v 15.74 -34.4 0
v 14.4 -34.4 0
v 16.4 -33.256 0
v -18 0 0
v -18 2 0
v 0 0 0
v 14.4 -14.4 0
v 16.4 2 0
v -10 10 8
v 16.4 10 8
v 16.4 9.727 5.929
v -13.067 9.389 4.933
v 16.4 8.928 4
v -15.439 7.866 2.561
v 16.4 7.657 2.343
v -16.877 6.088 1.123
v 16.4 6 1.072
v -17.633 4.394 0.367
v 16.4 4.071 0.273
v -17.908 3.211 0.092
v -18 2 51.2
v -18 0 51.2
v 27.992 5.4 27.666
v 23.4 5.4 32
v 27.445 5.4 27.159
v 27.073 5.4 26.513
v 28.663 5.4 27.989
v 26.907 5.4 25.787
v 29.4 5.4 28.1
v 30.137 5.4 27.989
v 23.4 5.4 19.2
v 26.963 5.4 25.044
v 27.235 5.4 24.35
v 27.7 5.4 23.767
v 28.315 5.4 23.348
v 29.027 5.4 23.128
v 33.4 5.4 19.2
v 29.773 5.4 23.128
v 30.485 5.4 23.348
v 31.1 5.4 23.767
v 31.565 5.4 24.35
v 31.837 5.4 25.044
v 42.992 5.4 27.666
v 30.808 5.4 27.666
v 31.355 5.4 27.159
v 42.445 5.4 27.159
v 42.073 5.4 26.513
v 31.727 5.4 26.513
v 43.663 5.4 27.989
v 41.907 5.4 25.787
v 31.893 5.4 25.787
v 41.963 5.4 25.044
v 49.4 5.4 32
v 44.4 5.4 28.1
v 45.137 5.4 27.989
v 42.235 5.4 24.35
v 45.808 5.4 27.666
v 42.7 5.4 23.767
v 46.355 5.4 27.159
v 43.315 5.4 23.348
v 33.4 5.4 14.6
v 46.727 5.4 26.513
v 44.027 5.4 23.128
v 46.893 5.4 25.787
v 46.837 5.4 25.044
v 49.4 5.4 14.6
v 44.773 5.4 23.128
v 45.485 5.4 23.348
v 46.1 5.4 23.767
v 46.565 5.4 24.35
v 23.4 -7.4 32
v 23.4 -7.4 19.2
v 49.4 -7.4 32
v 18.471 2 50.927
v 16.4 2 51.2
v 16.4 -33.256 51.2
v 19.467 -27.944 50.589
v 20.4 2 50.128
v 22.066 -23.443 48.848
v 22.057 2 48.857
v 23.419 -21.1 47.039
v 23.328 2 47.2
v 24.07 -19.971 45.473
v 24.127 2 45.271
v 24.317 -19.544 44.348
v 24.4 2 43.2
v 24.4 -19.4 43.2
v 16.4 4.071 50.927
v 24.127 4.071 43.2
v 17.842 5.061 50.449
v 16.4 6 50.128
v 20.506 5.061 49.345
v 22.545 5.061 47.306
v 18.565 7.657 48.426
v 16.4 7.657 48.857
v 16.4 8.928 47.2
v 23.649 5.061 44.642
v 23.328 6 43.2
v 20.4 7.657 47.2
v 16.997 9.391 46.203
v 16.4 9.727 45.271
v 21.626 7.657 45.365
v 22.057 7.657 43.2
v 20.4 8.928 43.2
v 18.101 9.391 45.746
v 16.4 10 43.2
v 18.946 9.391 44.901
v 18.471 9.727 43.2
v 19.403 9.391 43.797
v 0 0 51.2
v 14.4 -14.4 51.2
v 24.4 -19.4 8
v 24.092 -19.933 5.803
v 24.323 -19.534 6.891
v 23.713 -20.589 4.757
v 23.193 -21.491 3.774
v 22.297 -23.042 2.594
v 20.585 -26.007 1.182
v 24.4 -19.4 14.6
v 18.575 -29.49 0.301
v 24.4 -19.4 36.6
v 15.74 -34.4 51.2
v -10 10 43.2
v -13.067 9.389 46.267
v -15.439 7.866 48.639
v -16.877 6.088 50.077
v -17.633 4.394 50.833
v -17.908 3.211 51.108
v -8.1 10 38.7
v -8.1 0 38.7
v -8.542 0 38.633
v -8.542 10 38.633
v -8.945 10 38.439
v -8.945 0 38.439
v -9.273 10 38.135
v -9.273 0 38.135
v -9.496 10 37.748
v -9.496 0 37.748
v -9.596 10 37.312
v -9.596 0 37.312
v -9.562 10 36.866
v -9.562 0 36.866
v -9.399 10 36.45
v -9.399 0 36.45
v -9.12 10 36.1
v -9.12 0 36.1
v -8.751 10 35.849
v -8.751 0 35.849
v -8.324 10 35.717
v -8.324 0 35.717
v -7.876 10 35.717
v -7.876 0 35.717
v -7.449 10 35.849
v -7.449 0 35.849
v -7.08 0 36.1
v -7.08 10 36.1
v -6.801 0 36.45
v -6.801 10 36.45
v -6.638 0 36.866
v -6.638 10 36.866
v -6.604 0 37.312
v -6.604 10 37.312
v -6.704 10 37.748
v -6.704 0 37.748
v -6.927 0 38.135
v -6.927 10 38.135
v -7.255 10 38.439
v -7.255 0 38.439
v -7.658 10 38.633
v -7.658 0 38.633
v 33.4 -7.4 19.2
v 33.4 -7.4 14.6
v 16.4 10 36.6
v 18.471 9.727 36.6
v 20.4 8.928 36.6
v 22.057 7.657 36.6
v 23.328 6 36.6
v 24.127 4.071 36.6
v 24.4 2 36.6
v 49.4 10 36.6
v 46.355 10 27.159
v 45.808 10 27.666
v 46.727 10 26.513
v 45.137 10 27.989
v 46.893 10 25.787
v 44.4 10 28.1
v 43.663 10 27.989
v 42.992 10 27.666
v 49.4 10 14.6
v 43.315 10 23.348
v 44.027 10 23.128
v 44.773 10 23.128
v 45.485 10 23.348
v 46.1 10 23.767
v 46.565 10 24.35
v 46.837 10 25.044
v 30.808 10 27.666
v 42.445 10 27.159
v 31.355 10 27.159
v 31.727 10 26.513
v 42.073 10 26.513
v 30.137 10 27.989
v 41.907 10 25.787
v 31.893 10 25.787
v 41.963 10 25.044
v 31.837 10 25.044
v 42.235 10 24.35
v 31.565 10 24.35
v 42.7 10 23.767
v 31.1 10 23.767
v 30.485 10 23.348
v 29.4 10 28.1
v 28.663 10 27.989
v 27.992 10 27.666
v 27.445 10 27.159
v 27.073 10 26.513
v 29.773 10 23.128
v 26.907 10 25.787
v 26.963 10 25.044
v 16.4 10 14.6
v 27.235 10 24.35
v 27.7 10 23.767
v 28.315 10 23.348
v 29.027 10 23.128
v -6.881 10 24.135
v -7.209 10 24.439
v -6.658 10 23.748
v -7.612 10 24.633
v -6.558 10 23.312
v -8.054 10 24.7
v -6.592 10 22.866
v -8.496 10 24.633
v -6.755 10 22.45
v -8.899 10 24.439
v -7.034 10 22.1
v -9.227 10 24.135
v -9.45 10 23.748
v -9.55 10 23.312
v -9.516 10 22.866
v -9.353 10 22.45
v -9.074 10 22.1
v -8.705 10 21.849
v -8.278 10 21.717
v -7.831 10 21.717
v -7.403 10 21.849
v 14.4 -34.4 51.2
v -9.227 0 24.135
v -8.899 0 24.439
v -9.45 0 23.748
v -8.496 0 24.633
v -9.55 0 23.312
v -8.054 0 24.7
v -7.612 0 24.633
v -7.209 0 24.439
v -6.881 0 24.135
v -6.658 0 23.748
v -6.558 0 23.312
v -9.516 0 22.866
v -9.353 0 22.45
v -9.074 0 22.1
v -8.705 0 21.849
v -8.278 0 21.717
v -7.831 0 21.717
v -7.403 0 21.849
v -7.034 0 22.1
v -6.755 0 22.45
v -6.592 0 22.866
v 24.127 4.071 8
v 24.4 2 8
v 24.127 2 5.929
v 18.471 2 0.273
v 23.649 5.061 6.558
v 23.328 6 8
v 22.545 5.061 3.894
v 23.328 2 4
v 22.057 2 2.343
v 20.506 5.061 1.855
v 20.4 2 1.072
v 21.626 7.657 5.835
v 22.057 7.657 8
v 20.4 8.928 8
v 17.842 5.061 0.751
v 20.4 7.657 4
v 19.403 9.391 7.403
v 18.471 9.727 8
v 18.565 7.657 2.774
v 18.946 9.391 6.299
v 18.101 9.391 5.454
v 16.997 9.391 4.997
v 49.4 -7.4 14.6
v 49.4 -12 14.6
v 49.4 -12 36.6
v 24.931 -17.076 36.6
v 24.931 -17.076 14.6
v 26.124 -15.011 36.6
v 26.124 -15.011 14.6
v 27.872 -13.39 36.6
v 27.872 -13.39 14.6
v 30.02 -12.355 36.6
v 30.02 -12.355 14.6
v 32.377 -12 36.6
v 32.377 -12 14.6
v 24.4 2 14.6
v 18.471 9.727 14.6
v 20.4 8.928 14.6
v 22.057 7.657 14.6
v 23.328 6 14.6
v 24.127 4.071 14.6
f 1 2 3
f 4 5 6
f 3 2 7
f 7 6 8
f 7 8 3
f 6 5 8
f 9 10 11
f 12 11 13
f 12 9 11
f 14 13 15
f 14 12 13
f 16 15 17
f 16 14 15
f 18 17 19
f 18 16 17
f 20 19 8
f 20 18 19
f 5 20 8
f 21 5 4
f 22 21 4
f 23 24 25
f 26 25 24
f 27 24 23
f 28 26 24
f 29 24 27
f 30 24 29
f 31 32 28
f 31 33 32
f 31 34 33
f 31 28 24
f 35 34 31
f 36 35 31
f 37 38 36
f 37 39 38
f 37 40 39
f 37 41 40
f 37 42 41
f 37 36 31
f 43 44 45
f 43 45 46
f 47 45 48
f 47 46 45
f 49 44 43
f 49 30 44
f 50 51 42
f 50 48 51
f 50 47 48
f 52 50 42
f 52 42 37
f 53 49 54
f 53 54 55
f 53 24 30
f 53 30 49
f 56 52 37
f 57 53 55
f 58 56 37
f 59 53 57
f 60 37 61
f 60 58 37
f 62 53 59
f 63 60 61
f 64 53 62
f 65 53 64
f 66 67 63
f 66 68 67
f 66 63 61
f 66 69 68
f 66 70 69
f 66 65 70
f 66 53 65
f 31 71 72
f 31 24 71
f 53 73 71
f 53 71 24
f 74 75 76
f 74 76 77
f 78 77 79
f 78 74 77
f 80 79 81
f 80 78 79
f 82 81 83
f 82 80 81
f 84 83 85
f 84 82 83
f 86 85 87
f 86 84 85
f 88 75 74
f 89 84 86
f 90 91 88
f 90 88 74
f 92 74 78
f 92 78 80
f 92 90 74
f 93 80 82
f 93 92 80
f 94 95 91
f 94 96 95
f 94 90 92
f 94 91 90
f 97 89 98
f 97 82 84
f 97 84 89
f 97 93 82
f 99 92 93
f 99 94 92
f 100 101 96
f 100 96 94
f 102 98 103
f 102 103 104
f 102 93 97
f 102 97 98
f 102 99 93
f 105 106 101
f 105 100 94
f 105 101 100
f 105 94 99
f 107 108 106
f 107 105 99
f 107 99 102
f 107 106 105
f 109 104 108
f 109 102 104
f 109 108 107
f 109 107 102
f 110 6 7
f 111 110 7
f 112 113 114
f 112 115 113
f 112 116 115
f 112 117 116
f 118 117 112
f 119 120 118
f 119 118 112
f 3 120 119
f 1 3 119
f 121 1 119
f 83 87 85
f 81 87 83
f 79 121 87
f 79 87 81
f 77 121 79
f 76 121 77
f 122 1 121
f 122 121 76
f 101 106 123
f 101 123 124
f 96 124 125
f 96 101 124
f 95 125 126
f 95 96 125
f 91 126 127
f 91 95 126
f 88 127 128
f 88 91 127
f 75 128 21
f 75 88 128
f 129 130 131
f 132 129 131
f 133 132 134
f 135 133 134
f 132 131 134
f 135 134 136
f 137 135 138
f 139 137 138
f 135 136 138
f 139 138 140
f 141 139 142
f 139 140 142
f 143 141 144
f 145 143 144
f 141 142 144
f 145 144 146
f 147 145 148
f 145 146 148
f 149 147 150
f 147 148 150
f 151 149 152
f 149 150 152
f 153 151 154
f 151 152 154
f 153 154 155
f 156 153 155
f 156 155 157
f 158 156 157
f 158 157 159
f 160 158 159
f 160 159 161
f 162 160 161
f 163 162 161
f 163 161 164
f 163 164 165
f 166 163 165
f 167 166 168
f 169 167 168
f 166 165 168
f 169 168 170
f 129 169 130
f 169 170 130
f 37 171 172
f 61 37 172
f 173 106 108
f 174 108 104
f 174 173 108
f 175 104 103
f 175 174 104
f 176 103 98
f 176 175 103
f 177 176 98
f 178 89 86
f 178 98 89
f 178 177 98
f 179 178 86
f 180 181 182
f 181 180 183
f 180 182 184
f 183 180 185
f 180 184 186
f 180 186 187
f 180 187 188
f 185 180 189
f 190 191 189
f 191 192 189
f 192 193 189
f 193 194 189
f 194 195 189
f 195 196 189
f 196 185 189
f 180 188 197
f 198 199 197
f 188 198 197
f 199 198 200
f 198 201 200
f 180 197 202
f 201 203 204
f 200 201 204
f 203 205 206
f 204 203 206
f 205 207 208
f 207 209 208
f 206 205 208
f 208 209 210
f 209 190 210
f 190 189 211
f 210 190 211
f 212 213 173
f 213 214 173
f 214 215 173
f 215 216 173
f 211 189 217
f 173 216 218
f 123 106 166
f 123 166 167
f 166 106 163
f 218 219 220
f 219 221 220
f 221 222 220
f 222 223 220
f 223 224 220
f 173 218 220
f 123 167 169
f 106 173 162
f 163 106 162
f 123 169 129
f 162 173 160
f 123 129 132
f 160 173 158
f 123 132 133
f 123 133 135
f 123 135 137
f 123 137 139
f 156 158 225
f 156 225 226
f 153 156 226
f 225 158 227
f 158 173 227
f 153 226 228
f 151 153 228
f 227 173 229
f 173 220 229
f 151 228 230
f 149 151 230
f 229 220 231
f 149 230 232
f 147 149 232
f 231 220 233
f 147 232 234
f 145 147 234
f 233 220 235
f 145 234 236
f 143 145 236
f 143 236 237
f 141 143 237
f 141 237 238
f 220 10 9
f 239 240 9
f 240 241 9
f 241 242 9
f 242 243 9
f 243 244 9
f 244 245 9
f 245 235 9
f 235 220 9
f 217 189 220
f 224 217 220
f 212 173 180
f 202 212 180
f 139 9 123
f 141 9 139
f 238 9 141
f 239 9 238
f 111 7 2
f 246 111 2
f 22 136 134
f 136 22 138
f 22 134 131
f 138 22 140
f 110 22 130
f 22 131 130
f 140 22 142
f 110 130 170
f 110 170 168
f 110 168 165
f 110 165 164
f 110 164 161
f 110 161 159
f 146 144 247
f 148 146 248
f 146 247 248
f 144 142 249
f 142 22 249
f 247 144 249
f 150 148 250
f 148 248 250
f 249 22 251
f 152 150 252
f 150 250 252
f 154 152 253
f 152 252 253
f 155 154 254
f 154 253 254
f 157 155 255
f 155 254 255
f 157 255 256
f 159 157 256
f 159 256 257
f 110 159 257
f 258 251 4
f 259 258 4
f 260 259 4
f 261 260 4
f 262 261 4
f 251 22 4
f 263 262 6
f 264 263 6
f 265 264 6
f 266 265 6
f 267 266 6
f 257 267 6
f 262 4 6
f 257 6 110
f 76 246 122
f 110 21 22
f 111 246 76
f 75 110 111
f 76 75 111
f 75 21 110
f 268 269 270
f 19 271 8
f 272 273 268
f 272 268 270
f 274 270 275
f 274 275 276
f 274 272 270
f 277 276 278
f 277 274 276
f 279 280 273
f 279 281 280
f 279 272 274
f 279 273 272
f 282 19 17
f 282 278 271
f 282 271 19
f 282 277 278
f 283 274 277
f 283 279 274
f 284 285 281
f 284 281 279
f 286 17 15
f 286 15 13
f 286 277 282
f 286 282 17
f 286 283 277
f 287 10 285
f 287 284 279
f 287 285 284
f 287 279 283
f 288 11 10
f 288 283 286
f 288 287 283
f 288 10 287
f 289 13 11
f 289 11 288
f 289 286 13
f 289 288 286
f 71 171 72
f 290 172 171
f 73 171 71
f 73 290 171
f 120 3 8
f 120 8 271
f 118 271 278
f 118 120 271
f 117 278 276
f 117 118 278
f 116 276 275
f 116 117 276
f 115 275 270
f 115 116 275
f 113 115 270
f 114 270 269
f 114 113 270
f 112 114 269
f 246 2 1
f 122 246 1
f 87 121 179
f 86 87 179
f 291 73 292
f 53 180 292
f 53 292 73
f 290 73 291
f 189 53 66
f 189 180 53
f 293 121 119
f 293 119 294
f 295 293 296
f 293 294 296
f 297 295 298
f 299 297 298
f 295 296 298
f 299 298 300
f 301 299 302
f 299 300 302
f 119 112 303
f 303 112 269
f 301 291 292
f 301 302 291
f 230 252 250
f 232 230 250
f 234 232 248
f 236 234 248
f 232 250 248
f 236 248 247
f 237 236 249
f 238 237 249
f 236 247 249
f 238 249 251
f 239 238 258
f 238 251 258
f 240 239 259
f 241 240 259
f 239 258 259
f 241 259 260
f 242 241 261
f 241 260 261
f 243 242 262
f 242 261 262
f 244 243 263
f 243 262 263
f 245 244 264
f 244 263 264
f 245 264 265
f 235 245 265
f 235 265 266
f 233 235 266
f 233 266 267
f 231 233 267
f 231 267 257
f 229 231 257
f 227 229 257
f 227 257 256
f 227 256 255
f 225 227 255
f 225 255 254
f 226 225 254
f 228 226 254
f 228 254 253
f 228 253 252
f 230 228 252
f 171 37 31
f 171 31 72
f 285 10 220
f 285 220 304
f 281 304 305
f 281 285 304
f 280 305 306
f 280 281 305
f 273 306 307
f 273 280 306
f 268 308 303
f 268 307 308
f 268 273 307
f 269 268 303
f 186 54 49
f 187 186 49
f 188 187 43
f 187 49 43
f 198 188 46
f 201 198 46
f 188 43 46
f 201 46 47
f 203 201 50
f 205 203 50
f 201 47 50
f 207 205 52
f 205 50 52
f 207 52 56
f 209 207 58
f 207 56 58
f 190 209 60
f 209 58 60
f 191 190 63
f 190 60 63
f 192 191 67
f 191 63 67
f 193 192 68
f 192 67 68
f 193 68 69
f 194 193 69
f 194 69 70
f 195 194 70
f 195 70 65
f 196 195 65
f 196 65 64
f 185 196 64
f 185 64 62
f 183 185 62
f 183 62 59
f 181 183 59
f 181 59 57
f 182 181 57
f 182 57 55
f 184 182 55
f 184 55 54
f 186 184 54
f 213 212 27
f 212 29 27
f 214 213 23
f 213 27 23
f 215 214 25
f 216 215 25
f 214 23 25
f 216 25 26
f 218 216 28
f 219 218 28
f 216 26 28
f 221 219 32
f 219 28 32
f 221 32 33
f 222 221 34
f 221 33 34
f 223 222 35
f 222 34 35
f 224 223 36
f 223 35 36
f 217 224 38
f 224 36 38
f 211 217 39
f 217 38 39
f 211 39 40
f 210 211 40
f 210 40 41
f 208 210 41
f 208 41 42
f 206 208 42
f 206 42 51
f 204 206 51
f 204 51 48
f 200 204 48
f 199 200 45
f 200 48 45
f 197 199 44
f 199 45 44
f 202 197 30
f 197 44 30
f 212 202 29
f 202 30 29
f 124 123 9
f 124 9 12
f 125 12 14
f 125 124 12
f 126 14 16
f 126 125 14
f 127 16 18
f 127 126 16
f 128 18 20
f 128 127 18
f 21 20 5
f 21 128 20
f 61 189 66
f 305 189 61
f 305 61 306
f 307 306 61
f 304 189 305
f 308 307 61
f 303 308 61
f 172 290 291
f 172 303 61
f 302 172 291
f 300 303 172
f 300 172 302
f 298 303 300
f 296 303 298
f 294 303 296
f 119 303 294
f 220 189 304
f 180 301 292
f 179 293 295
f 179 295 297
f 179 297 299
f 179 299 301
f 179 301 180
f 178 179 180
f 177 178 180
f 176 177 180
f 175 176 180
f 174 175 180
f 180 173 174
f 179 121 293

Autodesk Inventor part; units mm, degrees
ref_plane "YZ Plane" through (0, 0, 0) normal (1, 0, 0) x (0, 1, 0)
ref_plane "XZ Plane" through (0, 0, 0) normal (0, 1, 0) x (-1, 0, 0)
ref_plane "XY Plane" through (0, 0, 0) normal (0, 0, 1) x (1, 0, 0)
sketch "Szkic1" plane through (0, 0, 0) normal (0, 0, 1) x (1, 0, 0)
  point P0 (0, 0)
sketch "Szkic2" plane through (0, 0, 0) normal (0, 0, 1) x (1, 0, 0)
  line L0 (-18, 0) -> (0, 0)
  line L1 (0, 0) -> (14.4, -14.4)
  line L2 (14.4, -14.4) -> (14.4, -34.4)
  line L3 (14.4, -34.4) -> (24.4, -34.4)
  line L4 (24.4, -34.4) -> (24.4, 0)
  line L5 (24.4, 0) -> (24.4, 10)
  line L6 (24.4, 10) -> (-18, 10)
  line L7 (-18, 10) -> (-18, 0)
  dimension "d0" = 14.4
  dimension "d1" = 14.4
  dimension "d2" = 18
  dimension "d3" = 20
  dimension "d4" = 10
  dimension "d5" = 10
extrude "Wyciągnięcie proste1" add sketch "Szkic2" along normal blind 51.2
sketch "Szkic3" plane through (24.4, -34.4, 0) normal (1, 0, 0) x (0, 0, -1)
  line L0 (0, 44.4) -> (0, 0) projected
  line L1 (0, 44.4) -> (-51.2, 44.4) projected
  line L2 (-51.2, 0) -> (-51.2, 44.4) projected
  line L3 (0, 0) -> (-51.2, 0) projected
  line L4 (-36.6, 44.4) -> (-14.6, 44.4)
  line L5 (-14.6, 44.4) -> (-14.6, 22.4)
  line L6 (-14.6, 22.4) -> (-36.6, 22.4)
  line L7 (-36.6, 22.4) -> (-36.6, 44.4)
  point P0 (0, 34.4)
  point P1 (-25.6, 44.4)
  dimension "d8" = 22
  dimension "d9" = 22
extrude "Wyciągnięcie proste2" add sketch "Szkic3" along normal blind 25 contours L5 L6 L7 L1
sketch "Szkic4" plane through (49.4, -34.4, 0) normal (1, 0, 0) x (0, 0, -1)
  line L0 (-14.6, 44.4) -> (-36.6, 44.4) projected
  line L1 (-36.6, 44.4) -> (-36.6, 22.4) projected
  line L2 (-36.6, 22.4) -> (-14.6, 22.4) projected
  line L3 (-14.6, 22.4) -> (-14.6, 44.4) projected
  line L4 (-32, 39.8) -> (-19.2, 39.8)
  line L5 (-19.2, 39.8) -> (-19.2, 27)
  line L6 (-19.2, 27) -> (-32, 27)
  line L7 (-32, 27) -> (-32, 39.8)
  point P0 (0, 34.4)
  point P1 (-25.6, 39.8)
  point P2 (-25.6, 44.4)
  point P3 (-19.2, 33.4)
  point P4 (-14.6, 33.4)
  dimension "d12" = 12.8
  dimension "d13" = 12.8
extrude "Wyciągnięcie proste3" cut sketch "Szkic4" against normal blind 26 contours L4 L5 L6 L7
sketch "Szkic5" plane through (-18, 10, 0) normal (0, 1, 0) x (1, 0, 0)
  line L0 (0, 0) -> (42.4, 0) projected
  line L1 (0, 0) -> (0, -51.2) projected
  line L2 (42.4, -51.2) -> (0, -51.2) projected
  line L3 (42.4, -36.6) -> (42.4, -51.2) projected
  line L4 (42.4, -36.6) -> (67.4, -36.6) projected
  line L5 (67.4, -14.6) -> (67.4, -36.6) projected
  line L6 (42.4, -14.6) -> (67.4, -14.6) projected
  line L7 (42.4, 0) -> (42.4, -14.6) projected
  line L8 (18, 0) -> (18, -51.2) projected
  point P0 (9.9, -37.2)
  point P1 (9.9459, -23.2)
  dimension "d17" = 8.1
  dimension "d18" = 14
  dimension "d19" = 14
hole "Otwór1" at (-8.1, 10, 37.2) at (-8.0541, 10, 23.2) direction (0, -1, 0) diameter 3 end through all
chamfer "Faza1" distance 15 angle 30 1 edges at (24.4, -34.4, 25.6) measured on face at (24.4, -26.9333, 21.9333)
fillet "Zaokrąglenie1" radius 8 1 edges at (24.4, -12, 25.6)
fillet "Zaokrąglenie2" radius 8 1 edges at (24.4, -4.7, 51.2)
fillet "Zaokrąglenie3" radius 8 1 edges at (24.4, -4.7, 0)
fillet "Zaokrąglenie4" radius 8 7 edges at (-18, 10, 25.6) (22.0569, 10, 48.8569) (24.4, 10, 39.9) (-0.8, 10, 51.2) (22.0569, 10, 2.3431) (24.4, 10, 11.3) (-0.8, 10, 0)
sketch "Szkic6" plane through (49.4, -34.4, 0) normal (1, 0, 0) x (0, 0, -1)
  line L0 (-32, 27) -> (-32, 39.8) projected
  line L1 (-32, 39.8) -> (-19.2, 39.8) projected
  line L2 (-19.2, 39.8) -> (-19.2, 27) projected
  line L3 (-19.2, 27) -> (-32, 27) projected
  line L4 (-14.6, 44.4) -> (-36.6, 44.4) projected
  line L5 (-36.6, 44.4) -> (-36.6, 22.4) projected
  line L6 (-36.6, 22.4) -> (-14.6, 22.4) projected
  line L7 (-14.6, 22.4) -> (-14.6, 44.4) projected
  line L8 (-20.5395, 39.8) -> (-13.1078, 39.8)
  line L9 (-13.1078, 39.8) -> (-13.1078, 27)
  line L10 (-13.1078, 27) -> (-20.5395, 27)
  line L11 (-20.5395, 27) -> (-20.5395, 39.8)
  point P0 (0, 34.4)
extrude "Wyciągnięcie proste4" cut sketch "Szkic6" against normal blind 16 contours L11 L1 L2 L3 | L2 L8 L7 L10 | L7 L8 L9 L10
sketch "Szkic7" plane through (49.4, 10, 36.6) normal (0, 1, 0) x (1, 0, 0)
  line L0 (-33, 0) -> (0, 0) projected
  line L1 (0, 22) -> (0, 0) projected
  line L2 (-33, 22) -> (0, 22) projected
  line L3 (-33, 28.6) -> (-33, 22) projected
  line L4 (-59.4, 28.6) -> (-33, 28.6) projected
  line L5 (-59.4, -6.6) -> (-59.4, 28.6) projected
  line L6 (-33, -6.6) -> (-59.4, -6.6) projected
  line L7 (-33, 0) -> (-33, -6.6) projected
  circle A0 centre (-57.5, -0.6) radius 1.5 projected
  circle A1 centre (-57.4541, 13.4) radius 1.5 projected
  point P0 (-49.4, 36.6)
  point P1 (-5, 11)
  point P2 (-20, 11)
  dimension "d36" = 5
  dimension "d37" = 15
hole "Otwór2" at (44.4, 10, 25.6) at (29.4, 10, 25.6) direction (0, -1, 0) diameter 5 depth 8 tip angle 118
properties part number "mocowanie_do_ramy"
